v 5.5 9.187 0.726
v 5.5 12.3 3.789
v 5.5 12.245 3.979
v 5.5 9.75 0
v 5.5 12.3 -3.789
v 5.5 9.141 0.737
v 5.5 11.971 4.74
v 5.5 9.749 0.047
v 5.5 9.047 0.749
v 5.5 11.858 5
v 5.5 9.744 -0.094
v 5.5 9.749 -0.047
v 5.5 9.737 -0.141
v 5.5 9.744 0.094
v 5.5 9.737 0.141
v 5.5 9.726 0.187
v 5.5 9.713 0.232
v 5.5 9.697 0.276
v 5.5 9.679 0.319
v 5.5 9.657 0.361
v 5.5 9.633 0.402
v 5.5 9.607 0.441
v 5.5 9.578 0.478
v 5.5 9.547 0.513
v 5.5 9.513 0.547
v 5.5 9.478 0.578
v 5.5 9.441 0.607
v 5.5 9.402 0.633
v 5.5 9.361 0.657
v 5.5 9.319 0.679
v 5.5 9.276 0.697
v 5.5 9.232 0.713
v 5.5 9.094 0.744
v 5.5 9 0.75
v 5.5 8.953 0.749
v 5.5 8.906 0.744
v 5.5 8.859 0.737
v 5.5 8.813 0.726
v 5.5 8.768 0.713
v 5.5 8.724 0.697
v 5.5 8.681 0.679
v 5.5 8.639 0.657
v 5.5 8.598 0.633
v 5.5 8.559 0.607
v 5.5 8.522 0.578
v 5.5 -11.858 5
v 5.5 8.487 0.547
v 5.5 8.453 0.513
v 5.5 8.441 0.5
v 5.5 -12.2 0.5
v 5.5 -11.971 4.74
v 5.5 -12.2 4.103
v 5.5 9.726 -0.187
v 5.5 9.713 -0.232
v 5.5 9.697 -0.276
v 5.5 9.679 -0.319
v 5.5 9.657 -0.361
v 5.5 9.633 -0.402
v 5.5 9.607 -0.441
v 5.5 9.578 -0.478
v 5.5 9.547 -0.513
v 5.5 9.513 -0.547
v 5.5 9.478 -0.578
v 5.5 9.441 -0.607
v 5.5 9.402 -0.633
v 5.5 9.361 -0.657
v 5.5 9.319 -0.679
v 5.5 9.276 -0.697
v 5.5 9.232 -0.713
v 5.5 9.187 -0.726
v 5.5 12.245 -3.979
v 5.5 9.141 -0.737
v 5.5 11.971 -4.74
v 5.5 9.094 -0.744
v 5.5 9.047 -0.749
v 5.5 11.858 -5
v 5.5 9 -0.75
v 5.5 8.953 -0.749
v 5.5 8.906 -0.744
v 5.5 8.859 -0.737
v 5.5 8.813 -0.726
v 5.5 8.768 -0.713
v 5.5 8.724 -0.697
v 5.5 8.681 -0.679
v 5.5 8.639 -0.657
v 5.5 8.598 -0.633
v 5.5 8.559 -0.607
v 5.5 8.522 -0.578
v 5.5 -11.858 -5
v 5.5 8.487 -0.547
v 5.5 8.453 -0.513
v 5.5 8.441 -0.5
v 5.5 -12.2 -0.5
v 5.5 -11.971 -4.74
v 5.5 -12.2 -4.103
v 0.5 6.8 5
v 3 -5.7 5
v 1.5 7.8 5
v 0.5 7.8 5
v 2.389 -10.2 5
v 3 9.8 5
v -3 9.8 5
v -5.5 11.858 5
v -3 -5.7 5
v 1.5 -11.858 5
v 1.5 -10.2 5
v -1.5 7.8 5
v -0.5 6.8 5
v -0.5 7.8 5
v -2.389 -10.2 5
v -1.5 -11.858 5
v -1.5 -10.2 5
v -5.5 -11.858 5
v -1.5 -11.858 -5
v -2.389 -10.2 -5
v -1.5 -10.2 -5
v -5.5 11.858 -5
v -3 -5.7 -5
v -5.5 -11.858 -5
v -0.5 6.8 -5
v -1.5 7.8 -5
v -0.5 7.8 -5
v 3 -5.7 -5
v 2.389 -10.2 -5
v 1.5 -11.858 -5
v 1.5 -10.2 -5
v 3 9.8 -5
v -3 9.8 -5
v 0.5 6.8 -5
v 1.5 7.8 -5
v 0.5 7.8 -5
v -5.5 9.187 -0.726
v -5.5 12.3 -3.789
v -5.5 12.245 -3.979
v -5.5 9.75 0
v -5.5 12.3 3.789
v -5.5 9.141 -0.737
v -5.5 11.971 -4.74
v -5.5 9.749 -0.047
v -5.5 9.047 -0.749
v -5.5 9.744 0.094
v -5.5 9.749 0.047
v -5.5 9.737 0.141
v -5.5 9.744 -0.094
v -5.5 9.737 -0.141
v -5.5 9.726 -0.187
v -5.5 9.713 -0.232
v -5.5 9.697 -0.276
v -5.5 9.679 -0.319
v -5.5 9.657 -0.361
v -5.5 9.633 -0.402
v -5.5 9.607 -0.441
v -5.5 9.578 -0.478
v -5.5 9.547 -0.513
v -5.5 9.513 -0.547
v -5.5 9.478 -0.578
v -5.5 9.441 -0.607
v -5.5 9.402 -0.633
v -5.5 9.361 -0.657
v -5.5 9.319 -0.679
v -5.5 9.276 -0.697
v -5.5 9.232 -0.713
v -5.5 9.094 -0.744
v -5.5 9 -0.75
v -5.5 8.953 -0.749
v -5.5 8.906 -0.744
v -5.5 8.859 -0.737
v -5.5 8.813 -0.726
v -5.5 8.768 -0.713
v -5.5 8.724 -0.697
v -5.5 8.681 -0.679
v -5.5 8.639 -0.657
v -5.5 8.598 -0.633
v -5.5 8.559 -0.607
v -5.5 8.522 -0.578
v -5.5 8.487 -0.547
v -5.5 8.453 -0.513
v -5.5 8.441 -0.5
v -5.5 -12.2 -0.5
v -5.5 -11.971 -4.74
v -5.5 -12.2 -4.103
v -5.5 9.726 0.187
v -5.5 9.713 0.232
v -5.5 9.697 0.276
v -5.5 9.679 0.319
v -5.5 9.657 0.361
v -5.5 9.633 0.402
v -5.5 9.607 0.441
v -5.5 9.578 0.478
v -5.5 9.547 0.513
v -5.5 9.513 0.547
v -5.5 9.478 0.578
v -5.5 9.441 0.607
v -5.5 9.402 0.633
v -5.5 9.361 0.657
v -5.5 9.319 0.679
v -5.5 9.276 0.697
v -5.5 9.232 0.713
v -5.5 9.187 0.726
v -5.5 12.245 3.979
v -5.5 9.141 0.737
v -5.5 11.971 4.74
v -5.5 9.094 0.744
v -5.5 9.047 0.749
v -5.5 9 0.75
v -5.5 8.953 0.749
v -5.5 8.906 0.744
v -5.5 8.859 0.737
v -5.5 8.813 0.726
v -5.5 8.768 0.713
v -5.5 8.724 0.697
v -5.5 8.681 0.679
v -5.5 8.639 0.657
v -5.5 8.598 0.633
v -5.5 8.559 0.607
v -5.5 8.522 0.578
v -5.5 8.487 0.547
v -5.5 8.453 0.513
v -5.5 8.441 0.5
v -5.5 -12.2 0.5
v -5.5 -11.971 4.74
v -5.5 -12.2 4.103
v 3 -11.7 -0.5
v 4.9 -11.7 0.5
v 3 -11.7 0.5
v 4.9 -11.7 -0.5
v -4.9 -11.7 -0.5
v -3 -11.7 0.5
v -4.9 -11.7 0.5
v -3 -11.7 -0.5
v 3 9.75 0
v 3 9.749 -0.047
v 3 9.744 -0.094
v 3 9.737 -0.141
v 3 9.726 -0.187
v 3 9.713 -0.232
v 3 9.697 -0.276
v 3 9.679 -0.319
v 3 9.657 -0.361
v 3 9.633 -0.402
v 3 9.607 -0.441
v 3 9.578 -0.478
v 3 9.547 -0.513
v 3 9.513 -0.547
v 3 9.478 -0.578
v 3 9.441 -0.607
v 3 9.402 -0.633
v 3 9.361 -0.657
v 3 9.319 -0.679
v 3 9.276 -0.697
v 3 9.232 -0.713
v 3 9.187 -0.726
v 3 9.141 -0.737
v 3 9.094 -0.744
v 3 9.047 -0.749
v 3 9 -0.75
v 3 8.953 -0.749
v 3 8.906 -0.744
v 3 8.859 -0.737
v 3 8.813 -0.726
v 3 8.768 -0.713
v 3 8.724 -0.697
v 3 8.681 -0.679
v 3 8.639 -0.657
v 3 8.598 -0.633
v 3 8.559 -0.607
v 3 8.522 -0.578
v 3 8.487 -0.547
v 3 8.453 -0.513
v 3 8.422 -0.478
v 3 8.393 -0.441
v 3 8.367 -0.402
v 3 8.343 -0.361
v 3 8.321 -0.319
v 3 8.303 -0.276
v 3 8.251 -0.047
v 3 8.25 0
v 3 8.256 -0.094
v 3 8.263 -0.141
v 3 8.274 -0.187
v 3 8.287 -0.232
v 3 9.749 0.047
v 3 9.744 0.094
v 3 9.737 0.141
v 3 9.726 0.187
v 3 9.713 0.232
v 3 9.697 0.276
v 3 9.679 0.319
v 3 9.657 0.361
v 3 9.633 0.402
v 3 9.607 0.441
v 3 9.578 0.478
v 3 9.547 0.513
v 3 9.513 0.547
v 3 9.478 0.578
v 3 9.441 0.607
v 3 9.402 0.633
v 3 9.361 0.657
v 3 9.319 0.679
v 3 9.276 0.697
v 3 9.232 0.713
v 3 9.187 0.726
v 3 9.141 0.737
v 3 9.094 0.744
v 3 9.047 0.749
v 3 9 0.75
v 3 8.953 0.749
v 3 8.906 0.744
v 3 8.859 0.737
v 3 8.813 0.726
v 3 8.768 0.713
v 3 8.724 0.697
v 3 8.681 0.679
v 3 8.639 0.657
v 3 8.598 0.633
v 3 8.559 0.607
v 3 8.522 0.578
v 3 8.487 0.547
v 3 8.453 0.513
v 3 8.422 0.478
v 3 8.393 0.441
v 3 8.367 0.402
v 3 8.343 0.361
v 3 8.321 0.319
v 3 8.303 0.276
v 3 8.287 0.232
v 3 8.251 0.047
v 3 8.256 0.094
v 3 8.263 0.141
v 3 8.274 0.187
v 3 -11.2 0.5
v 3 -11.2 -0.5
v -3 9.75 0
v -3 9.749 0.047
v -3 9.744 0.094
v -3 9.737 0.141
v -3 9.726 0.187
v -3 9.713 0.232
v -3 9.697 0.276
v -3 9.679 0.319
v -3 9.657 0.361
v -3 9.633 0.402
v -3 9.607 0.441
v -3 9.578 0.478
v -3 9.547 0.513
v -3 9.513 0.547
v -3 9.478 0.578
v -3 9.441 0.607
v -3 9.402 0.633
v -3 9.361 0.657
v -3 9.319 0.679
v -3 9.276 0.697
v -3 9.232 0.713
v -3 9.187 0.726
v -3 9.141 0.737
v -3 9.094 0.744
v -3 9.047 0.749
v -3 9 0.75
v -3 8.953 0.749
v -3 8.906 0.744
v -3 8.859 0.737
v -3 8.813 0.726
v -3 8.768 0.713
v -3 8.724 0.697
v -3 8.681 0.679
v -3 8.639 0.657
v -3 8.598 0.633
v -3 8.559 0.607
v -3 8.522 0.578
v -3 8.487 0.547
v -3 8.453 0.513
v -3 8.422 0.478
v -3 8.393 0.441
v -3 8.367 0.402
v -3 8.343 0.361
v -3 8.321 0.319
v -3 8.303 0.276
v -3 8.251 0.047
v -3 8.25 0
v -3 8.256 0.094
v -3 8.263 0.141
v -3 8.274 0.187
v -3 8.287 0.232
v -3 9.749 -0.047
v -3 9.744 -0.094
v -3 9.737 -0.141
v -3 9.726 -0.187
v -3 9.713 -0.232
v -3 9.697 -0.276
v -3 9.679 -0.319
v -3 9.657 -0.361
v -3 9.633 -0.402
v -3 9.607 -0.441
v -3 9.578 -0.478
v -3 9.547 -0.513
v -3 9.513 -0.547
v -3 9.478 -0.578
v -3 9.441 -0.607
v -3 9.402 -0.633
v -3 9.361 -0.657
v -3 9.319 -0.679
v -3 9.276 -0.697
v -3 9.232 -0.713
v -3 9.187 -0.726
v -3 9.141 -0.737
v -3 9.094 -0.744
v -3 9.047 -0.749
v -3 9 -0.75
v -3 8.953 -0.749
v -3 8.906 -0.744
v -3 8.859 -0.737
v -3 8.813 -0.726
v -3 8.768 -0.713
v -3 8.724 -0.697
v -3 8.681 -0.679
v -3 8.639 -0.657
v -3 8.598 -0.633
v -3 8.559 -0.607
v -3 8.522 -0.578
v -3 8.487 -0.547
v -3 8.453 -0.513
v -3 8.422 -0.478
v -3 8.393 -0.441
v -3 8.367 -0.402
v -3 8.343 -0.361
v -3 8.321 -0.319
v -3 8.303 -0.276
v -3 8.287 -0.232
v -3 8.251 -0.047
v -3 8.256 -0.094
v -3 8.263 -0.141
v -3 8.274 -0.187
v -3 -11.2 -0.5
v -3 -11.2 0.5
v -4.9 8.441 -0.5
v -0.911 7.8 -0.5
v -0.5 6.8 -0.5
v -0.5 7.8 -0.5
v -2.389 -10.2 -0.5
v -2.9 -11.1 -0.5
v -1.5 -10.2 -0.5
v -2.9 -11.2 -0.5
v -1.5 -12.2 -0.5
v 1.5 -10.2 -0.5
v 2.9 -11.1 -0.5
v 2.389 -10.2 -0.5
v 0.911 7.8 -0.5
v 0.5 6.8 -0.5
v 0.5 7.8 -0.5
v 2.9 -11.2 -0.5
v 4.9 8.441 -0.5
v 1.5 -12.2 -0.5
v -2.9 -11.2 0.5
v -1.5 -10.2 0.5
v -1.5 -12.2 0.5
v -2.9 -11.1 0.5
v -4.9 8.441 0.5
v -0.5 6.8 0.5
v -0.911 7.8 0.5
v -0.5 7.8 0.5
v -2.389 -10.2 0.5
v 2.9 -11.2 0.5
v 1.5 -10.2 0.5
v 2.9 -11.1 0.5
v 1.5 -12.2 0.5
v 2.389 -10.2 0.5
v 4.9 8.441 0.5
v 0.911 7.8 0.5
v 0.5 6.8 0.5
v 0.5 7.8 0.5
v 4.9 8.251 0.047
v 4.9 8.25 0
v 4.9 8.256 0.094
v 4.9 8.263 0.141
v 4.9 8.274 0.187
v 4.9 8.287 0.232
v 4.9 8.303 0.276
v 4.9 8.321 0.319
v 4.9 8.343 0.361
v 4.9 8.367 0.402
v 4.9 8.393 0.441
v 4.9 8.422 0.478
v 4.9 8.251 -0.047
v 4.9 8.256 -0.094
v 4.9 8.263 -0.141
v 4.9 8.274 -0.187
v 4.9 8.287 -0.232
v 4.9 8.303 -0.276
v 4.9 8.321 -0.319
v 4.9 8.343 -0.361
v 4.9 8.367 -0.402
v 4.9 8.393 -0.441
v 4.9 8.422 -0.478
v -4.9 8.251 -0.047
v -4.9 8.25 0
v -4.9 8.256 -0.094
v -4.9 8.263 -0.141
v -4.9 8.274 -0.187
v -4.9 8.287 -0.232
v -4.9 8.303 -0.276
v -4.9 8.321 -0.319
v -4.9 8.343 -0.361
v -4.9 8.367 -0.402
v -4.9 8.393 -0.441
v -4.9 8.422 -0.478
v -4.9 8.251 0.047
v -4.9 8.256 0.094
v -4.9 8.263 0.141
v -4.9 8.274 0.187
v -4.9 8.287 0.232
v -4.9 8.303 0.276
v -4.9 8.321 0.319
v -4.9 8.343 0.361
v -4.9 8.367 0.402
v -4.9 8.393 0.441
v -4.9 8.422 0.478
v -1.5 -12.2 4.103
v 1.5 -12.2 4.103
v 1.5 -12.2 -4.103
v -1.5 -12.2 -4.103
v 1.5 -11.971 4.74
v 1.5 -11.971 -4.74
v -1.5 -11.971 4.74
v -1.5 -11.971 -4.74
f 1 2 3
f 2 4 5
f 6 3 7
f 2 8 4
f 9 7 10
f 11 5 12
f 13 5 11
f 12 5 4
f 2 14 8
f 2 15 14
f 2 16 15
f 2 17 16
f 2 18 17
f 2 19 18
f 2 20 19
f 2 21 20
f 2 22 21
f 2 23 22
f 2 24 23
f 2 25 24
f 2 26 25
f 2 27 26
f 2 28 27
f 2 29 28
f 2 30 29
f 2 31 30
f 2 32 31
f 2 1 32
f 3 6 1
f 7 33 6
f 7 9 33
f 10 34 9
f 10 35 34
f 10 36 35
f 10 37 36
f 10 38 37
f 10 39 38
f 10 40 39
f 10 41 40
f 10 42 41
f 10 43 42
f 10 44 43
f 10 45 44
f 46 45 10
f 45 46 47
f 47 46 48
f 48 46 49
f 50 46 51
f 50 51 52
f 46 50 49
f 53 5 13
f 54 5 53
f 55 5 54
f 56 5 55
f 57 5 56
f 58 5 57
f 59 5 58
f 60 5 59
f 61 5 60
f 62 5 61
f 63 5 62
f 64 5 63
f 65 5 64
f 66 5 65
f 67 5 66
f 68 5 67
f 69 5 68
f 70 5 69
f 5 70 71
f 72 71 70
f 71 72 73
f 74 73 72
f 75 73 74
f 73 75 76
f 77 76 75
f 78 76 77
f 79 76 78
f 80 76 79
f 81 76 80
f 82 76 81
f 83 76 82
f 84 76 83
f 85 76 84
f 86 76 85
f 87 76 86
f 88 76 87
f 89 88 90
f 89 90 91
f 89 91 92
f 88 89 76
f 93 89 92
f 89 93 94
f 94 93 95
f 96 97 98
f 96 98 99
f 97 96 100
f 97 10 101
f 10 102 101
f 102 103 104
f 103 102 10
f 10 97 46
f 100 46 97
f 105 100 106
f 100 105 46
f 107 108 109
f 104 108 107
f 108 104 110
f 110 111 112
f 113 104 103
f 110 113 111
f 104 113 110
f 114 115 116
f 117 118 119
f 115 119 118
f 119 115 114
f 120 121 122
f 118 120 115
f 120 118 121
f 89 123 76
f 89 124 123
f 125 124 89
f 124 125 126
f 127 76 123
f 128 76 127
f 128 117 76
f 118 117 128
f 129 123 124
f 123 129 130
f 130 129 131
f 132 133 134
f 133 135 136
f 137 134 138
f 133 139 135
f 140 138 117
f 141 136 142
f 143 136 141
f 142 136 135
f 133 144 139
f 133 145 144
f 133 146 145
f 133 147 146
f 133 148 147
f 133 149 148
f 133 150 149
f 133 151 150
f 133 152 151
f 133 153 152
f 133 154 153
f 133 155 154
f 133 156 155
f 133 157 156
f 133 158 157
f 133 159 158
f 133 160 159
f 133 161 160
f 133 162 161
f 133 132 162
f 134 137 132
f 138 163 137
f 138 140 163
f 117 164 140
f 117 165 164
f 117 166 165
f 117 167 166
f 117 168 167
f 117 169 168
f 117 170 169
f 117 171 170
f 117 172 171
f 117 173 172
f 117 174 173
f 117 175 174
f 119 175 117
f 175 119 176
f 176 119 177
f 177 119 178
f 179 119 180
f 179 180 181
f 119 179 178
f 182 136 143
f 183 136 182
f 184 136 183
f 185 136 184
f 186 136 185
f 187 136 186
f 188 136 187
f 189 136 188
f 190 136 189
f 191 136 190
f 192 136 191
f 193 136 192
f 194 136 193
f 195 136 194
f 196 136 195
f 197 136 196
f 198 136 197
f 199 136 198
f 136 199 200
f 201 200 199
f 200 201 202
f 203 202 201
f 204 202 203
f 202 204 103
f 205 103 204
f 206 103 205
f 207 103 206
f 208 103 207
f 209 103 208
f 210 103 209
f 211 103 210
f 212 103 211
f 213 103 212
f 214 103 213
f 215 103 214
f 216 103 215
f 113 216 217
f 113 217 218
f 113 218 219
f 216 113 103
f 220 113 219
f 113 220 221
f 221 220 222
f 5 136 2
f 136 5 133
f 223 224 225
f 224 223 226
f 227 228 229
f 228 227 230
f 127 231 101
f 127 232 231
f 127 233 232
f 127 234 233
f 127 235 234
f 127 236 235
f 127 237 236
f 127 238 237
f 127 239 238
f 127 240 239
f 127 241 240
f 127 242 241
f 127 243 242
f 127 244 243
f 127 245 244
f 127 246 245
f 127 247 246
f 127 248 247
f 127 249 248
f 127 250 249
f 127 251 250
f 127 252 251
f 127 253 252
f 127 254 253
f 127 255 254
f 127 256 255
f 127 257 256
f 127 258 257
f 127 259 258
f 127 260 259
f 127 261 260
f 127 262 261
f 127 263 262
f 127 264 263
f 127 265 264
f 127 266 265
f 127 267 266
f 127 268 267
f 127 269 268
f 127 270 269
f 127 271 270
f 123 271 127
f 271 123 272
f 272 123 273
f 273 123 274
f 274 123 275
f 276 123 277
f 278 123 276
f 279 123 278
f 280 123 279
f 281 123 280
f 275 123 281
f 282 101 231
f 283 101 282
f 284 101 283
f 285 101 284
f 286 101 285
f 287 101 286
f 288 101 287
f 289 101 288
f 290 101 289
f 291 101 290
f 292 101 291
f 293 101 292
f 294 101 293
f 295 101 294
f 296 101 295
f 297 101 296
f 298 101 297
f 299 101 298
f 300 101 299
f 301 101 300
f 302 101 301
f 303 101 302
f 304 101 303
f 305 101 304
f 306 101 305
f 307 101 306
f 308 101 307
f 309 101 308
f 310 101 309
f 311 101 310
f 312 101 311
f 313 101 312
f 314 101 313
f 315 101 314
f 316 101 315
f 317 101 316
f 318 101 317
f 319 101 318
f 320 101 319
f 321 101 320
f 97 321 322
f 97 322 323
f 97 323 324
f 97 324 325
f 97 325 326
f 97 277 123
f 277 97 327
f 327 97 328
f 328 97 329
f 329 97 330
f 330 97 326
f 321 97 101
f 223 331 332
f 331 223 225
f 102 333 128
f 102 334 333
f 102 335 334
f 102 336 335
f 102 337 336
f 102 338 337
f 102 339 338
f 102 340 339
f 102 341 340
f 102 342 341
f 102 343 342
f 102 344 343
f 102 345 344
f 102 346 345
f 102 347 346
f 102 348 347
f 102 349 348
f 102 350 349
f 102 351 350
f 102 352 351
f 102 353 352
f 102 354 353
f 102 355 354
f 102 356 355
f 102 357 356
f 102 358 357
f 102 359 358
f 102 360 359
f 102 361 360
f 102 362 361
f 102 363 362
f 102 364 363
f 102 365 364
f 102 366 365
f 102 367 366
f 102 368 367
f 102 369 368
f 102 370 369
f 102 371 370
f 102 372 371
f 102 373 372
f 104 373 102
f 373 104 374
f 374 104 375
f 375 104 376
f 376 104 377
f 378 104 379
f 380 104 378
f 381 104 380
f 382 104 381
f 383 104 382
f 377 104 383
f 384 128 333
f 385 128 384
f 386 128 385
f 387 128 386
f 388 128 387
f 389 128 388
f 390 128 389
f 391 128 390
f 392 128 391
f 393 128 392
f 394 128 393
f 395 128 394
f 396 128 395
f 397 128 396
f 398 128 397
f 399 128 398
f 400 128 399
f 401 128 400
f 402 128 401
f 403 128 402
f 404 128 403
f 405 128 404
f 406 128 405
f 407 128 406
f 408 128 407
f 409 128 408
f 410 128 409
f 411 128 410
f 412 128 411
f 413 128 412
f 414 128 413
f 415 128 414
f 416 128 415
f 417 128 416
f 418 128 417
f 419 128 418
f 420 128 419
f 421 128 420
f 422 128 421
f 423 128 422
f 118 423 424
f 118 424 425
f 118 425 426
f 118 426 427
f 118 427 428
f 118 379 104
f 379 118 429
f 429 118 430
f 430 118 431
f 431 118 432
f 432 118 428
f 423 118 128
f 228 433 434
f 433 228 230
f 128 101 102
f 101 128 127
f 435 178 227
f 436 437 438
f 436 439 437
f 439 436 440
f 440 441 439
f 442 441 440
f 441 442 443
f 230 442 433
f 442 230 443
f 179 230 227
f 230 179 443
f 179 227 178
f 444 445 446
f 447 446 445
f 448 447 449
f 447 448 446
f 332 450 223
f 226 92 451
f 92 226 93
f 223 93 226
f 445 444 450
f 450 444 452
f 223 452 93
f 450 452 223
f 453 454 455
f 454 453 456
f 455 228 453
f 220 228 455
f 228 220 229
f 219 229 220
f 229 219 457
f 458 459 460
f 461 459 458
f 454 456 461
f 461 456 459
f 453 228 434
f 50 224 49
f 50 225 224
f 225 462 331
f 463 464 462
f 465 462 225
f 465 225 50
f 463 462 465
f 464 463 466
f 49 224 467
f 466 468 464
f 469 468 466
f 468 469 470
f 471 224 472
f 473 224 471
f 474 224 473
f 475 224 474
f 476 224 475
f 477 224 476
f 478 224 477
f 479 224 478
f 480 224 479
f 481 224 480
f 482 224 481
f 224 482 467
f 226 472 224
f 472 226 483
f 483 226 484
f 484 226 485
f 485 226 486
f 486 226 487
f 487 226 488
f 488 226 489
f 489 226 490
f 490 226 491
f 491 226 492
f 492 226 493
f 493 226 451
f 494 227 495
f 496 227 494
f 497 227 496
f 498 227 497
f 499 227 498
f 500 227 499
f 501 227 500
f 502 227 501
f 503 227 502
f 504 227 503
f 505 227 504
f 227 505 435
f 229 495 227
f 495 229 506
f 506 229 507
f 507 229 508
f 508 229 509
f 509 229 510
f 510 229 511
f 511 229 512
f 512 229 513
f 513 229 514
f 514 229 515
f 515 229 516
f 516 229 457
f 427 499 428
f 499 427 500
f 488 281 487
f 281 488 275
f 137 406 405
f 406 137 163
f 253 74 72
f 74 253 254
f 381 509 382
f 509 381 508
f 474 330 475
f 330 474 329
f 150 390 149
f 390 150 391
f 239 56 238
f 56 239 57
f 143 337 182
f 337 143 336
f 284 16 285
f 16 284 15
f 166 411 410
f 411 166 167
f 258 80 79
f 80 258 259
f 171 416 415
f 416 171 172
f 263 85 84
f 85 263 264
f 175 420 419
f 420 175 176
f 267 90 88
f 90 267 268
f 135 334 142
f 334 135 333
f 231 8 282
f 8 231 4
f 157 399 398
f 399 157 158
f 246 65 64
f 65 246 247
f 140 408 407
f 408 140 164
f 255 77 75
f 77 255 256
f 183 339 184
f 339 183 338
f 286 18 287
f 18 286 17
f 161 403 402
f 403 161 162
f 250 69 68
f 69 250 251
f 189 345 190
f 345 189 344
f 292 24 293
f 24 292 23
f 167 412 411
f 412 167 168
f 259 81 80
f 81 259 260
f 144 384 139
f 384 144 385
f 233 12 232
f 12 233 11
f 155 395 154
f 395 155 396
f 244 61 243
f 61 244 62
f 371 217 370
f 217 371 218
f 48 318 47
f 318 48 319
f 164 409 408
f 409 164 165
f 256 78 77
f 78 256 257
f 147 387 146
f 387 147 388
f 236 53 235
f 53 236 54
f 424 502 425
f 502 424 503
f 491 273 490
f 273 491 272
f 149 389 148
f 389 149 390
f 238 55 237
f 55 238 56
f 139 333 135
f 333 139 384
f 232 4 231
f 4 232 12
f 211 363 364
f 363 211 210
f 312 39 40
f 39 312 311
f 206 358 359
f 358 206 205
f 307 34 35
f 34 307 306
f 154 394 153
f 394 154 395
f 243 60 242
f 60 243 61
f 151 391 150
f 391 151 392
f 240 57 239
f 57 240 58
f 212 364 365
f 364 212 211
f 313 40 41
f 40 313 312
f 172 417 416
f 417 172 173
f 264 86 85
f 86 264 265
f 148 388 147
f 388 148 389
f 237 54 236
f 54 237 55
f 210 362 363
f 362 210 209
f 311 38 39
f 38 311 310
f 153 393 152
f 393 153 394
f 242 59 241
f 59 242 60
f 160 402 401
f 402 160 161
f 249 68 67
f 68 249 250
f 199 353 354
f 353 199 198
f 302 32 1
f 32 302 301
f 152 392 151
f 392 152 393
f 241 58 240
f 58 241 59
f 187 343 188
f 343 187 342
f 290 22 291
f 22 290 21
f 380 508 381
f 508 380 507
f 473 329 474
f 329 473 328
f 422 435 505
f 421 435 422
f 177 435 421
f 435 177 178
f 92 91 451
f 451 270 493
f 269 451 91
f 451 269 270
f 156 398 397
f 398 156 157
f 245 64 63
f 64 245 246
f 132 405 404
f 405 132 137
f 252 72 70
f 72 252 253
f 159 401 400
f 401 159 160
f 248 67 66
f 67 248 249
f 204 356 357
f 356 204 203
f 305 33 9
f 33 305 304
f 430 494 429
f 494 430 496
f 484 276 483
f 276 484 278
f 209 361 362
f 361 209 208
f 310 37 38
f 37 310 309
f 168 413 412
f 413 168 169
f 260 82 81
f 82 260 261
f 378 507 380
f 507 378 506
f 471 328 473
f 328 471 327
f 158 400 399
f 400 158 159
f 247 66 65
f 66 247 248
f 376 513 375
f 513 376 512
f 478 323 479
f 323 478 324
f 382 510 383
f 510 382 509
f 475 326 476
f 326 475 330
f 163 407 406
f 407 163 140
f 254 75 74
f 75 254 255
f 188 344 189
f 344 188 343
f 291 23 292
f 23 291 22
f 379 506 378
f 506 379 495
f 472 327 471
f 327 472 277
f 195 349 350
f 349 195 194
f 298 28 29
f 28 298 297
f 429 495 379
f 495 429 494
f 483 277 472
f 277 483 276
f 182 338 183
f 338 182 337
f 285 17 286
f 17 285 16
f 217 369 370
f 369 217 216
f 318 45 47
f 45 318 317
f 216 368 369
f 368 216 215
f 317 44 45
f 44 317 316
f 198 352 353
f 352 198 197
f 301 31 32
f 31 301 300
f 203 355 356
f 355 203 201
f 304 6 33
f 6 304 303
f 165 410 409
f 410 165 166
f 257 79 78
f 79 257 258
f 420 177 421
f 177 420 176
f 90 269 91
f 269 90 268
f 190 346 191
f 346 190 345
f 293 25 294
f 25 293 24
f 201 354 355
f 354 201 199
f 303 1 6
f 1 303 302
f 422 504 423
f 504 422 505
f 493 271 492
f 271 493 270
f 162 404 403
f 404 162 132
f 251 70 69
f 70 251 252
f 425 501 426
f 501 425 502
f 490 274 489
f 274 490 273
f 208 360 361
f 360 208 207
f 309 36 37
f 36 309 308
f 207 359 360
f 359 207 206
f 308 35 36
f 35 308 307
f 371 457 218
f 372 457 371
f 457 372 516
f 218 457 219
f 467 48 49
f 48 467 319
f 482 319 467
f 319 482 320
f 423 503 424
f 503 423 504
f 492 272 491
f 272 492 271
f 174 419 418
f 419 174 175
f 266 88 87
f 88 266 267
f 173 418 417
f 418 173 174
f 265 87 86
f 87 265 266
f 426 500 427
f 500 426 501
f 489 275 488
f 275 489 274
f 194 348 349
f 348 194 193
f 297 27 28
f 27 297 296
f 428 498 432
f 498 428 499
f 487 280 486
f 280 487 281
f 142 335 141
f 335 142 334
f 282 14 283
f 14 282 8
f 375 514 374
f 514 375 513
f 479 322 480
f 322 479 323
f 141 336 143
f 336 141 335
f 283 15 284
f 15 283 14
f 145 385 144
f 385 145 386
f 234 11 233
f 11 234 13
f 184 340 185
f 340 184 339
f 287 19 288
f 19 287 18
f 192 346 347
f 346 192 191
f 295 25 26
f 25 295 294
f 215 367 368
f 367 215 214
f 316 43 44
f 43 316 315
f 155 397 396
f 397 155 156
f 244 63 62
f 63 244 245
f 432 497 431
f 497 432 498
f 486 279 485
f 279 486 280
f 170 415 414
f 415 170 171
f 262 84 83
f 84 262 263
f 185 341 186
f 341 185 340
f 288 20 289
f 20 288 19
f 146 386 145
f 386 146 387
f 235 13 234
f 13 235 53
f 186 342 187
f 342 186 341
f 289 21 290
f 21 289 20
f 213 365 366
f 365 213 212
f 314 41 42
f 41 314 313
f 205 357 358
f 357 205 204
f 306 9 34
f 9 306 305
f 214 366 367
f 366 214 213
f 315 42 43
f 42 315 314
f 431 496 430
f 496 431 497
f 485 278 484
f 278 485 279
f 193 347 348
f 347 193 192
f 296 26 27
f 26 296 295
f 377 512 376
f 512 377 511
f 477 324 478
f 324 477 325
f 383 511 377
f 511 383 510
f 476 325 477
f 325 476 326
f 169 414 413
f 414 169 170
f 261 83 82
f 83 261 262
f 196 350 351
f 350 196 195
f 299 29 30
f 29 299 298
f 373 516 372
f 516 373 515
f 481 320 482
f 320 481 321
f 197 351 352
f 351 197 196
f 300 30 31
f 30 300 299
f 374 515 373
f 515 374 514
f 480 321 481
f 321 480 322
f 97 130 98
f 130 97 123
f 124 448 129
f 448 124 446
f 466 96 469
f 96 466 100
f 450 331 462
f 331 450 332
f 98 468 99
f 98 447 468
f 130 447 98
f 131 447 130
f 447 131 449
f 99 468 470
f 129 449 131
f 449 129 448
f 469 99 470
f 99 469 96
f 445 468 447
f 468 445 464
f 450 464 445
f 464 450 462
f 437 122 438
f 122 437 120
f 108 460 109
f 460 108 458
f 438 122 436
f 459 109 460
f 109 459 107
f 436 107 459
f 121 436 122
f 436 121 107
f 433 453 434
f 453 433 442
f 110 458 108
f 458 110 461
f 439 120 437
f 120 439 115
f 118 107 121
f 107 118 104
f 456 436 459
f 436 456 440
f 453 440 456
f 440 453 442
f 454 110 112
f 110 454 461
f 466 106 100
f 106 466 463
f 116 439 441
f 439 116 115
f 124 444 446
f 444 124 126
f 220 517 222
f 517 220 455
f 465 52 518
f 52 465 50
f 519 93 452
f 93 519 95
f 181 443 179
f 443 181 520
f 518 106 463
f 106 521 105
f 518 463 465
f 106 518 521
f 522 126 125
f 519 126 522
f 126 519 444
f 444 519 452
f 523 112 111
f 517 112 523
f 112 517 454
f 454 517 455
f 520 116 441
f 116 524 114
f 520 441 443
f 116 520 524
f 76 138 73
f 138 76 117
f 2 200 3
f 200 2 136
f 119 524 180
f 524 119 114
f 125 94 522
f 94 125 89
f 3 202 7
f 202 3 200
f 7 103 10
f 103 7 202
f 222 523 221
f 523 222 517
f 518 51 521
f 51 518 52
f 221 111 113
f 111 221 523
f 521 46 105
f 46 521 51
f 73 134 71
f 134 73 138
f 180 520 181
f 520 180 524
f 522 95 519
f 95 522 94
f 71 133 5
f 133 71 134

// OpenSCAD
$fn=100;
INCH=25.4;

Vytah_prumer=INCH*1.25;    // prumer okularoveho vytahu
Posun_pruzoru=0;          // posun pruzoru pro odecitani ze stupnice
Tloustka_sten=3.2;

//Rozmery sroubu a matky pro M3 [mm]
M3_screw_diameter = 3.2;                //prumer sroubu (zavit)
M3_screw_head_height = 3;               //vyska hlavy sroubu
M3_nut_height = 2.7;                    //vyska matky
M3_nut_diameter = 6.6;                  //prumer matky (kruznice opsana)
M3_screw_head_diameter = 6.6;           //prumer hlavy sroubu

// Polomery (osa x,y)
r1=Vytah_prumer/2;      // polomer okularoveho vytahu
r2=r1+3;                // polomer kolimatoru
r3=r1-3.2;    // polomer vzreyu v horni casti kolimatoru
r4=3;                   // polomer pruzoru pro laser
r5=11;                   // polomer dutiny na ulozeni pouzdra diody
r6=10.5+1.5;            // polomer ulozeni baterie
r10=r2-2-2;           //polomer volne plochy (baterie/vicko)
r11=r2-2;             //polomer ulozeni vicka


diameter = 20;          //prumer barerie
thickness = 3;          //tloustka baterie
space = 1;            //mezera mezi baterii a obalkou

holder_width = 10;       //sirka pruzinky
holder_wall = 3;        //tloustka steny


difference() {
    translate([0,0.3,0]) {
        union() {
            union() {
                difference(){
                    translate([0,0,0])    
                    cube([thickness+holder_wall*2+space*2, diameter+holder_wall+1, holder_width], center=true);
                     
                    translate([0, -holder_wall/2-7+3, 0])
                        cube([thickness+space*3, diameter+10, holder_width+0.1], center=true);
                    
                    
                    hull() {
                        translate([thickness/2+space+holder_wall-0.3, -diameter/2 - space-4+3, 0])
                            cube([0.6,1.2,1],center=true);
                        translate([thickness/2+space+holder_wall-0.3, 6+3-1, 0])
                            cube([0.6,1.2,1],center=true);  
                    }
                    hull() {
                        translate([-thickness/2-space-holder_wall+0.3, -diameter/2 - space-4+3, 0])
                            cube([0.6,1.2,1],center=true);
                        translate([-thickness/2-space-holder_wall+0.3, 6+3-1, 0])
                            cube([0.6,1.2,1],center=true);  
                    }
                    translate([0, 8.7, 0])
                        rotate([0, 90, 0])
                            cylinder(d=1.5, h=20, center = true, $fn=100);
                        
                    
                    
                }
                

                difference() {
                    hull(){
                        translate([thickness, -diameter/2 - space, 0])        
                            cube([1, 1, holder_width],center=true);           
                        translate([1, 5+3-1, 0])       
                            cube([1, 1, holder_width],center=true);       
                    }


                    hull() {
                        translate([thickness-0.3, -diameter/2 - space-1, 0])
                            cube([0.4,1.2,1],center=true);
                        translate([0.7, 5+3-1, 0])
                            cube([0.4,1.2,1],center=true);     
                    }        
                }      

                difference() {        
                    hull(){
                        translate([-thickness, -diameter/2 - space, 0])
                            cube([1, 1, holder_width],center=true);
                        translate([-1, 5+3-1, 0])
                            cube([1, 1, holder_width],center=true);
                    }


                    hull() {
                        translate([-thickness+0.3, -diameter/2 - space-1, 0])
                            cube([0.4,1.2,1],center=true);
                        translate([-0.7, 5+3-1, 0])
                            cube([0.4,1.2,1],center=true);
                            
                    }        
                }
            }
        
            difference() {
                translate([0,-diameter/2-1.5,0])
                    cube([11,2,10],center=true);
                #translate([0,-diameter/2-2,0])
                    cube([15,4,1],center=true);
                #translate([0,-diameter/2-2,0])
                    rotate([0,90,0])
                        cube([15,4,thickness],center=true);
        }
    }    
}
rotate([0,90,0])  {  
    difference() {
    
        cylinder(r=20,h=20,center=true);
        cylinder(r=r11-1-2-1,h=20,center=true);
    }
}
 }       
echo(space*2+diameter+thickness*2);
